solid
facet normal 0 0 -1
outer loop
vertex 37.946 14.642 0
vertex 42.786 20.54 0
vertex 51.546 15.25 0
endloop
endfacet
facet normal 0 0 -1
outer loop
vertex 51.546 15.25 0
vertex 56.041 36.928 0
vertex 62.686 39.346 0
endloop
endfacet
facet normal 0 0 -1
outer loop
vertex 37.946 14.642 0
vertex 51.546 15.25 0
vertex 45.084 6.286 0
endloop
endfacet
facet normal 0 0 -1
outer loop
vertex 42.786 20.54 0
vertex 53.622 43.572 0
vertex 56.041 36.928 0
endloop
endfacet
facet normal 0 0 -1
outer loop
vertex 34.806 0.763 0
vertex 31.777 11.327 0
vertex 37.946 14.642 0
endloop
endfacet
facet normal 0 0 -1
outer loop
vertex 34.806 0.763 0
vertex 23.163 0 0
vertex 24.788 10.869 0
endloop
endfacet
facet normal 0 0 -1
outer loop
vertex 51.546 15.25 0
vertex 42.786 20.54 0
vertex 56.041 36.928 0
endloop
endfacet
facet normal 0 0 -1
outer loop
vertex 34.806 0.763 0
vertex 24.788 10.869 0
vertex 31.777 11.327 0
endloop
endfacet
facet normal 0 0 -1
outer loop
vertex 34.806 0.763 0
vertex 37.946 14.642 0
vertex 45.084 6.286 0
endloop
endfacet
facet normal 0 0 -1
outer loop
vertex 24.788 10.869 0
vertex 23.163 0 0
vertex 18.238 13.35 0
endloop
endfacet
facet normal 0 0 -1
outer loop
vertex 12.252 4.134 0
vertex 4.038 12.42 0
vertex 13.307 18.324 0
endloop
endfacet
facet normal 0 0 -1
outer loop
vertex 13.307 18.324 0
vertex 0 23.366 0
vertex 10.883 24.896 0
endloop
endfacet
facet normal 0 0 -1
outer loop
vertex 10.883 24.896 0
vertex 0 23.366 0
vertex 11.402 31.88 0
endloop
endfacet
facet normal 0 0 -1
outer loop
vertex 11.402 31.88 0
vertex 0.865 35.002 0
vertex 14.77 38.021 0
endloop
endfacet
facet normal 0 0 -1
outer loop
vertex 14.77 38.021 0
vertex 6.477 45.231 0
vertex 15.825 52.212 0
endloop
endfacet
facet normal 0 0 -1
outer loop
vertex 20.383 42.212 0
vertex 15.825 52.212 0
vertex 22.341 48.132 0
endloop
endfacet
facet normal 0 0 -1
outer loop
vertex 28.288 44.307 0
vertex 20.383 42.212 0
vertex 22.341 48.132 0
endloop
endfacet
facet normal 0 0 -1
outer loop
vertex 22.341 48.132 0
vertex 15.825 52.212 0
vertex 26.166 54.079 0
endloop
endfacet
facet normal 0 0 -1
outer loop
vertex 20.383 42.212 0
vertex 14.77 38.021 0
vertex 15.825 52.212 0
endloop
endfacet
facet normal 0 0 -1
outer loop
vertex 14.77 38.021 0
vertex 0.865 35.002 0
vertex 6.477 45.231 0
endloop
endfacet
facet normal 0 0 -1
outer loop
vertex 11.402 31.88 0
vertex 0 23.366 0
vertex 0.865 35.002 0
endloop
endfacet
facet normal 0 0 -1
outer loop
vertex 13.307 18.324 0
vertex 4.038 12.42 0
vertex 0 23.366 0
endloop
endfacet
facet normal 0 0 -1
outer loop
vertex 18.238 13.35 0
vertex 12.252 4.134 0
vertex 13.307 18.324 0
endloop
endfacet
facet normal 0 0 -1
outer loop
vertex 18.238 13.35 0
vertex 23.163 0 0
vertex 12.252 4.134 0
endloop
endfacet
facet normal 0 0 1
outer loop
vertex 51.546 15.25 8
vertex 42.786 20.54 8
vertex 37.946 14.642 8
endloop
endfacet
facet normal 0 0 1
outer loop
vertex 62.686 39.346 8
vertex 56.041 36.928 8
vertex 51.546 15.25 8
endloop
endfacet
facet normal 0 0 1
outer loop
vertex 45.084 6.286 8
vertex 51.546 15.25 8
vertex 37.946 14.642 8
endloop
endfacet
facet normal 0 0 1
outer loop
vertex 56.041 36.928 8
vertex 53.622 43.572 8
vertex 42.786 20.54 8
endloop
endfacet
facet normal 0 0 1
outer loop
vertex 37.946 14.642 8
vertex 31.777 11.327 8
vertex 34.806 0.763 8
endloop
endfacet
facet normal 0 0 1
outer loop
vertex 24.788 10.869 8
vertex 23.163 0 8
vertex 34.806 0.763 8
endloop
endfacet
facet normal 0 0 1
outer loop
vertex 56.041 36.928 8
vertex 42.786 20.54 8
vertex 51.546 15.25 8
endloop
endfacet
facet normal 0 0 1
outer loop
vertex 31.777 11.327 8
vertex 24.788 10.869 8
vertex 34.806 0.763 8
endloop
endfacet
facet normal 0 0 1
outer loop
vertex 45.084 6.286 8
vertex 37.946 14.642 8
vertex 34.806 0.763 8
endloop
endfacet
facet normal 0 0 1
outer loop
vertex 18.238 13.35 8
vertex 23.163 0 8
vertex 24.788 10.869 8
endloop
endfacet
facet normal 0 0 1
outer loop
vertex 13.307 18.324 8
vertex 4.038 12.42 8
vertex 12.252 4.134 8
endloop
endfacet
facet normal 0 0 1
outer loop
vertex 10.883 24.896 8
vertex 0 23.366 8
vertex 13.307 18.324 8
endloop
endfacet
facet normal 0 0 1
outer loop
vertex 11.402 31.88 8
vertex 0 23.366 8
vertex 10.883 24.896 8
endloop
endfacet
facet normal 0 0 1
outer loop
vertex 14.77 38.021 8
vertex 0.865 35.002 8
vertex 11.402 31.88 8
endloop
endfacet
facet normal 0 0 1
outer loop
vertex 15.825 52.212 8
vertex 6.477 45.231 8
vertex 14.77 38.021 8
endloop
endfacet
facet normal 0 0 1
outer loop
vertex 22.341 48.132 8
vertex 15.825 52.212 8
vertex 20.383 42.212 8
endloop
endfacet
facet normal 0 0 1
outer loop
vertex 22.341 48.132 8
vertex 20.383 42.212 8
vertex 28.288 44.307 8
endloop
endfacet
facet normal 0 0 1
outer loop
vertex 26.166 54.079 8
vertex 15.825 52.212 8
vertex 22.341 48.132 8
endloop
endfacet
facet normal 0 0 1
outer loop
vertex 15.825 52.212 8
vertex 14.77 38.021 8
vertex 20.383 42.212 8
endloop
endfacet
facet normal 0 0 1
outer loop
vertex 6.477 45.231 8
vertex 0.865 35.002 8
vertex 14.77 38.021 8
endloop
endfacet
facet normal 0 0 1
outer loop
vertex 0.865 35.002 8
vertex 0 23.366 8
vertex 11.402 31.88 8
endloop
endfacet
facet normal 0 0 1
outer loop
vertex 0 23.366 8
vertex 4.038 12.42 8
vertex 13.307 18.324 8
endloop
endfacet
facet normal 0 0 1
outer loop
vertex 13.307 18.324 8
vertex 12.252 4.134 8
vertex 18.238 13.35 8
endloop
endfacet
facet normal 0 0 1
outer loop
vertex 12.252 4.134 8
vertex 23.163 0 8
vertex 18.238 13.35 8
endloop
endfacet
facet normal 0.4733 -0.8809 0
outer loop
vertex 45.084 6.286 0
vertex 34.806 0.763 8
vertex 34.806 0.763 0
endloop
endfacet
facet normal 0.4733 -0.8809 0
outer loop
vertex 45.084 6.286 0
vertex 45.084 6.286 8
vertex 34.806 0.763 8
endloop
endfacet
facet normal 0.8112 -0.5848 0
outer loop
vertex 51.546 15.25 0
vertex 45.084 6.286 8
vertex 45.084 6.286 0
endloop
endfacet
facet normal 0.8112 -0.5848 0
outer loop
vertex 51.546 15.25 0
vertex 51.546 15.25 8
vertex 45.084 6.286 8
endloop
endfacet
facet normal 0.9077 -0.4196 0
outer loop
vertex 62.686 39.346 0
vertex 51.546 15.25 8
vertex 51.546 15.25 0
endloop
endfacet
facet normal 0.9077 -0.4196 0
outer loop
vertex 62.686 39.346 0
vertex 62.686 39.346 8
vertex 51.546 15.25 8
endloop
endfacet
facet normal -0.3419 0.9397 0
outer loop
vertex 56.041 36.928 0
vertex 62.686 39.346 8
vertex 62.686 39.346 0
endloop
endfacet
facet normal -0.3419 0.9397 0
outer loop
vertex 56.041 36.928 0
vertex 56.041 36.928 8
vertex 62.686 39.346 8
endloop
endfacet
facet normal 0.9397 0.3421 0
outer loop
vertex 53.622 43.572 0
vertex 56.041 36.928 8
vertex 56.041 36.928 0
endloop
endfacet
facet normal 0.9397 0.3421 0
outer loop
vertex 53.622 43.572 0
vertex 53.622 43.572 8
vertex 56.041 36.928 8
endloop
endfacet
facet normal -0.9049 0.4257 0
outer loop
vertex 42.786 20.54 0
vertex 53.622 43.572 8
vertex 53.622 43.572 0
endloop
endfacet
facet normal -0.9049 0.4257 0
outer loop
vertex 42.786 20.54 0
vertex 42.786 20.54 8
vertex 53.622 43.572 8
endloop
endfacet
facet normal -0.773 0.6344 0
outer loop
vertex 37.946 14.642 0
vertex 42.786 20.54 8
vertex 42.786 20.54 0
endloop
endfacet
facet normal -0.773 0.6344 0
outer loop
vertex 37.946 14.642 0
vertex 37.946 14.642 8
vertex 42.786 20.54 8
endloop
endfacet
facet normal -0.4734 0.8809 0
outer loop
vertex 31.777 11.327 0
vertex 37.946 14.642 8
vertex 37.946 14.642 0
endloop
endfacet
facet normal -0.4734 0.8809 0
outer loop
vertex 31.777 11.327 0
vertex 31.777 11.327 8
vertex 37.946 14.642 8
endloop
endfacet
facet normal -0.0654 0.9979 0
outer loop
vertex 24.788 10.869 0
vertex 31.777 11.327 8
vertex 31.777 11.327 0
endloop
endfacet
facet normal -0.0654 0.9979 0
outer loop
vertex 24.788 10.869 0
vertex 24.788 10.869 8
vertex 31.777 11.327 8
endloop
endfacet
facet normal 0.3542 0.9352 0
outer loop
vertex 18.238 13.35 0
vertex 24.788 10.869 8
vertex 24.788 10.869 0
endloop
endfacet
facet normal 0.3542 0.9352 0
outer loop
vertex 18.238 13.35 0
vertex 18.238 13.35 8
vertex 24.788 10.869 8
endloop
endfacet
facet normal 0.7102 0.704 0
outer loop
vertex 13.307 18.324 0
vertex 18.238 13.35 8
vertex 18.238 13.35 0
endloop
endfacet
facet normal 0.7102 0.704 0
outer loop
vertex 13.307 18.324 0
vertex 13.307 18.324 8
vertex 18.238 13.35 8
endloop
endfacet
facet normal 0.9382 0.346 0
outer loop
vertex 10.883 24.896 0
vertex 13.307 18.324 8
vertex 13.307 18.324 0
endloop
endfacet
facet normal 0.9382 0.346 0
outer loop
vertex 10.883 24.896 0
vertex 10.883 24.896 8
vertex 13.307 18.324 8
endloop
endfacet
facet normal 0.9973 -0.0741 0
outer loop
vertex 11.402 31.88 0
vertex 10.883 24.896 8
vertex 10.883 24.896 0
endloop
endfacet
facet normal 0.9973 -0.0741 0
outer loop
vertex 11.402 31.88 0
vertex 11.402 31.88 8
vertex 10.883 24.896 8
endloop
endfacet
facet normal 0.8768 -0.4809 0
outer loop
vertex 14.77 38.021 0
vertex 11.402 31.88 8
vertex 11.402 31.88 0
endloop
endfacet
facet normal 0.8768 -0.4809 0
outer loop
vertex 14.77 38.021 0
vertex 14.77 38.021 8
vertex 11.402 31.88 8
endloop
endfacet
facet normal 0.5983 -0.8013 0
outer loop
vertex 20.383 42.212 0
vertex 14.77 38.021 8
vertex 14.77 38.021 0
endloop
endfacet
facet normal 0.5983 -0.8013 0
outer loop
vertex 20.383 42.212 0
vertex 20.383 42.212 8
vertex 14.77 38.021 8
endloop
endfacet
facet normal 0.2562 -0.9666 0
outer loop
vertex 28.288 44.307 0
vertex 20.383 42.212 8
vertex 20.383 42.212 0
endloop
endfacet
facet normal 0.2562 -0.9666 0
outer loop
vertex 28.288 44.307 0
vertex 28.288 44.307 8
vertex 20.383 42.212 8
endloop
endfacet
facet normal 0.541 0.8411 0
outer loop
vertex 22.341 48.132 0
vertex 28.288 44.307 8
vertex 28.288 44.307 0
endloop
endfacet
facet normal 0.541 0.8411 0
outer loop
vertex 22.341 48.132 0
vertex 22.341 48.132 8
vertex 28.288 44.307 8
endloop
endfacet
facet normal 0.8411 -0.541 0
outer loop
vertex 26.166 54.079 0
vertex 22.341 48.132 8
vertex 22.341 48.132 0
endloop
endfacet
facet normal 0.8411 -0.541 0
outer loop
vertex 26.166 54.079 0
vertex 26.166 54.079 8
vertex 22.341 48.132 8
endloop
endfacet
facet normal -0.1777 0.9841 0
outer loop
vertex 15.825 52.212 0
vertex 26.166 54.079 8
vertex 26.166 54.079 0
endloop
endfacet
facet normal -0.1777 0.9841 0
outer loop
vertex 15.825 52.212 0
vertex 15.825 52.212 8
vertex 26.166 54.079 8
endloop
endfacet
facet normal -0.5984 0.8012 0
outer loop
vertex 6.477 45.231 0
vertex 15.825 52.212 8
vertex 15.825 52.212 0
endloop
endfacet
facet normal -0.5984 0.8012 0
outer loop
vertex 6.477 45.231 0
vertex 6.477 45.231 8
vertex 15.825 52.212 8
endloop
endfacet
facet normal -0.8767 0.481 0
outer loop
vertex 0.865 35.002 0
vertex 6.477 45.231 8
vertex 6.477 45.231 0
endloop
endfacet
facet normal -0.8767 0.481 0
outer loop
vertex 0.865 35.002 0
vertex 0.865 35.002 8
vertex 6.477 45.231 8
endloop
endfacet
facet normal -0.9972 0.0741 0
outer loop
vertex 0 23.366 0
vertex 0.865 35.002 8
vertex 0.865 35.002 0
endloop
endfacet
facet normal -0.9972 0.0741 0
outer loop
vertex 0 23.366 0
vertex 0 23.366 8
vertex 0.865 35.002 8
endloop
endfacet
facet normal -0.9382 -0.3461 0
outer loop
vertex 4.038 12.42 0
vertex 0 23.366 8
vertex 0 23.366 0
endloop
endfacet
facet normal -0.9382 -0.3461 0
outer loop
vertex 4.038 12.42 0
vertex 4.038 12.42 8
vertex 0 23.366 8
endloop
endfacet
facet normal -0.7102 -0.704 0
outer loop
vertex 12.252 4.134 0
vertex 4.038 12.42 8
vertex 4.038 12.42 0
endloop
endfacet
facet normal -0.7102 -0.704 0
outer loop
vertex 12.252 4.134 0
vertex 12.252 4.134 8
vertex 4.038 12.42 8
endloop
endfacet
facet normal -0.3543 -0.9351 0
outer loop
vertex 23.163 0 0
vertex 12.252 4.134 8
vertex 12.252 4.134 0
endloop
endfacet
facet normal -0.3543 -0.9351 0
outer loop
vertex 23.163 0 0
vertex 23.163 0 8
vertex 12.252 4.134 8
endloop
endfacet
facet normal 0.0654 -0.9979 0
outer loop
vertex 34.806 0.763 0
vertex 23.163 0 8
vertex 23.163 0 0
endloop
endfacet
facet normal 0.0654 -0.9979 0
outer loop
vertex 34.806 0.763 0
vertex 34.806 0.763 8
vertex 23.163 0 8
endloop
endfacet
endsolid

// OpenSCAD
$fn = 32;

// ----------------------------------------------------------------------
// Hook plate: curl radius 22 mm over 245 degrees, 10 mm thick band
// ----------------------------------------------------------------------

// --- parameters (mm) ---
profile_height = 8;       // extrusion height
profile_points = 26;      // points of the closed outline

profile = [[22.341, 48.132], [26.166, 54.079], [15.825, 52.212], [6.477, 45.231], [0.865, 35.002], [0, 23.366], [4.038, 12.42], [12.252, 4.134], [23.163, 0], [34.806, 0.763], [45.084, 6.286], [51.546, 15.25], [62.686, 39.346], [56.041, 36.928], [53.622, 43.572], [42.786, 20.54], [37.946, 14.642], [31.777, 11.327], [24.788, 10.869], [18.238, 13.35], [13.307, 18.324], [10.883, 24.896], [11.402, 31.88], [14.77, 38.021], [20.383, 42.212], [28.288, 44.307]];  // single closed polygon, 26 points, counter clockwise

// --- the one profile operation ---
linear_extrude(height = profile_height) polygon(points = profile);
